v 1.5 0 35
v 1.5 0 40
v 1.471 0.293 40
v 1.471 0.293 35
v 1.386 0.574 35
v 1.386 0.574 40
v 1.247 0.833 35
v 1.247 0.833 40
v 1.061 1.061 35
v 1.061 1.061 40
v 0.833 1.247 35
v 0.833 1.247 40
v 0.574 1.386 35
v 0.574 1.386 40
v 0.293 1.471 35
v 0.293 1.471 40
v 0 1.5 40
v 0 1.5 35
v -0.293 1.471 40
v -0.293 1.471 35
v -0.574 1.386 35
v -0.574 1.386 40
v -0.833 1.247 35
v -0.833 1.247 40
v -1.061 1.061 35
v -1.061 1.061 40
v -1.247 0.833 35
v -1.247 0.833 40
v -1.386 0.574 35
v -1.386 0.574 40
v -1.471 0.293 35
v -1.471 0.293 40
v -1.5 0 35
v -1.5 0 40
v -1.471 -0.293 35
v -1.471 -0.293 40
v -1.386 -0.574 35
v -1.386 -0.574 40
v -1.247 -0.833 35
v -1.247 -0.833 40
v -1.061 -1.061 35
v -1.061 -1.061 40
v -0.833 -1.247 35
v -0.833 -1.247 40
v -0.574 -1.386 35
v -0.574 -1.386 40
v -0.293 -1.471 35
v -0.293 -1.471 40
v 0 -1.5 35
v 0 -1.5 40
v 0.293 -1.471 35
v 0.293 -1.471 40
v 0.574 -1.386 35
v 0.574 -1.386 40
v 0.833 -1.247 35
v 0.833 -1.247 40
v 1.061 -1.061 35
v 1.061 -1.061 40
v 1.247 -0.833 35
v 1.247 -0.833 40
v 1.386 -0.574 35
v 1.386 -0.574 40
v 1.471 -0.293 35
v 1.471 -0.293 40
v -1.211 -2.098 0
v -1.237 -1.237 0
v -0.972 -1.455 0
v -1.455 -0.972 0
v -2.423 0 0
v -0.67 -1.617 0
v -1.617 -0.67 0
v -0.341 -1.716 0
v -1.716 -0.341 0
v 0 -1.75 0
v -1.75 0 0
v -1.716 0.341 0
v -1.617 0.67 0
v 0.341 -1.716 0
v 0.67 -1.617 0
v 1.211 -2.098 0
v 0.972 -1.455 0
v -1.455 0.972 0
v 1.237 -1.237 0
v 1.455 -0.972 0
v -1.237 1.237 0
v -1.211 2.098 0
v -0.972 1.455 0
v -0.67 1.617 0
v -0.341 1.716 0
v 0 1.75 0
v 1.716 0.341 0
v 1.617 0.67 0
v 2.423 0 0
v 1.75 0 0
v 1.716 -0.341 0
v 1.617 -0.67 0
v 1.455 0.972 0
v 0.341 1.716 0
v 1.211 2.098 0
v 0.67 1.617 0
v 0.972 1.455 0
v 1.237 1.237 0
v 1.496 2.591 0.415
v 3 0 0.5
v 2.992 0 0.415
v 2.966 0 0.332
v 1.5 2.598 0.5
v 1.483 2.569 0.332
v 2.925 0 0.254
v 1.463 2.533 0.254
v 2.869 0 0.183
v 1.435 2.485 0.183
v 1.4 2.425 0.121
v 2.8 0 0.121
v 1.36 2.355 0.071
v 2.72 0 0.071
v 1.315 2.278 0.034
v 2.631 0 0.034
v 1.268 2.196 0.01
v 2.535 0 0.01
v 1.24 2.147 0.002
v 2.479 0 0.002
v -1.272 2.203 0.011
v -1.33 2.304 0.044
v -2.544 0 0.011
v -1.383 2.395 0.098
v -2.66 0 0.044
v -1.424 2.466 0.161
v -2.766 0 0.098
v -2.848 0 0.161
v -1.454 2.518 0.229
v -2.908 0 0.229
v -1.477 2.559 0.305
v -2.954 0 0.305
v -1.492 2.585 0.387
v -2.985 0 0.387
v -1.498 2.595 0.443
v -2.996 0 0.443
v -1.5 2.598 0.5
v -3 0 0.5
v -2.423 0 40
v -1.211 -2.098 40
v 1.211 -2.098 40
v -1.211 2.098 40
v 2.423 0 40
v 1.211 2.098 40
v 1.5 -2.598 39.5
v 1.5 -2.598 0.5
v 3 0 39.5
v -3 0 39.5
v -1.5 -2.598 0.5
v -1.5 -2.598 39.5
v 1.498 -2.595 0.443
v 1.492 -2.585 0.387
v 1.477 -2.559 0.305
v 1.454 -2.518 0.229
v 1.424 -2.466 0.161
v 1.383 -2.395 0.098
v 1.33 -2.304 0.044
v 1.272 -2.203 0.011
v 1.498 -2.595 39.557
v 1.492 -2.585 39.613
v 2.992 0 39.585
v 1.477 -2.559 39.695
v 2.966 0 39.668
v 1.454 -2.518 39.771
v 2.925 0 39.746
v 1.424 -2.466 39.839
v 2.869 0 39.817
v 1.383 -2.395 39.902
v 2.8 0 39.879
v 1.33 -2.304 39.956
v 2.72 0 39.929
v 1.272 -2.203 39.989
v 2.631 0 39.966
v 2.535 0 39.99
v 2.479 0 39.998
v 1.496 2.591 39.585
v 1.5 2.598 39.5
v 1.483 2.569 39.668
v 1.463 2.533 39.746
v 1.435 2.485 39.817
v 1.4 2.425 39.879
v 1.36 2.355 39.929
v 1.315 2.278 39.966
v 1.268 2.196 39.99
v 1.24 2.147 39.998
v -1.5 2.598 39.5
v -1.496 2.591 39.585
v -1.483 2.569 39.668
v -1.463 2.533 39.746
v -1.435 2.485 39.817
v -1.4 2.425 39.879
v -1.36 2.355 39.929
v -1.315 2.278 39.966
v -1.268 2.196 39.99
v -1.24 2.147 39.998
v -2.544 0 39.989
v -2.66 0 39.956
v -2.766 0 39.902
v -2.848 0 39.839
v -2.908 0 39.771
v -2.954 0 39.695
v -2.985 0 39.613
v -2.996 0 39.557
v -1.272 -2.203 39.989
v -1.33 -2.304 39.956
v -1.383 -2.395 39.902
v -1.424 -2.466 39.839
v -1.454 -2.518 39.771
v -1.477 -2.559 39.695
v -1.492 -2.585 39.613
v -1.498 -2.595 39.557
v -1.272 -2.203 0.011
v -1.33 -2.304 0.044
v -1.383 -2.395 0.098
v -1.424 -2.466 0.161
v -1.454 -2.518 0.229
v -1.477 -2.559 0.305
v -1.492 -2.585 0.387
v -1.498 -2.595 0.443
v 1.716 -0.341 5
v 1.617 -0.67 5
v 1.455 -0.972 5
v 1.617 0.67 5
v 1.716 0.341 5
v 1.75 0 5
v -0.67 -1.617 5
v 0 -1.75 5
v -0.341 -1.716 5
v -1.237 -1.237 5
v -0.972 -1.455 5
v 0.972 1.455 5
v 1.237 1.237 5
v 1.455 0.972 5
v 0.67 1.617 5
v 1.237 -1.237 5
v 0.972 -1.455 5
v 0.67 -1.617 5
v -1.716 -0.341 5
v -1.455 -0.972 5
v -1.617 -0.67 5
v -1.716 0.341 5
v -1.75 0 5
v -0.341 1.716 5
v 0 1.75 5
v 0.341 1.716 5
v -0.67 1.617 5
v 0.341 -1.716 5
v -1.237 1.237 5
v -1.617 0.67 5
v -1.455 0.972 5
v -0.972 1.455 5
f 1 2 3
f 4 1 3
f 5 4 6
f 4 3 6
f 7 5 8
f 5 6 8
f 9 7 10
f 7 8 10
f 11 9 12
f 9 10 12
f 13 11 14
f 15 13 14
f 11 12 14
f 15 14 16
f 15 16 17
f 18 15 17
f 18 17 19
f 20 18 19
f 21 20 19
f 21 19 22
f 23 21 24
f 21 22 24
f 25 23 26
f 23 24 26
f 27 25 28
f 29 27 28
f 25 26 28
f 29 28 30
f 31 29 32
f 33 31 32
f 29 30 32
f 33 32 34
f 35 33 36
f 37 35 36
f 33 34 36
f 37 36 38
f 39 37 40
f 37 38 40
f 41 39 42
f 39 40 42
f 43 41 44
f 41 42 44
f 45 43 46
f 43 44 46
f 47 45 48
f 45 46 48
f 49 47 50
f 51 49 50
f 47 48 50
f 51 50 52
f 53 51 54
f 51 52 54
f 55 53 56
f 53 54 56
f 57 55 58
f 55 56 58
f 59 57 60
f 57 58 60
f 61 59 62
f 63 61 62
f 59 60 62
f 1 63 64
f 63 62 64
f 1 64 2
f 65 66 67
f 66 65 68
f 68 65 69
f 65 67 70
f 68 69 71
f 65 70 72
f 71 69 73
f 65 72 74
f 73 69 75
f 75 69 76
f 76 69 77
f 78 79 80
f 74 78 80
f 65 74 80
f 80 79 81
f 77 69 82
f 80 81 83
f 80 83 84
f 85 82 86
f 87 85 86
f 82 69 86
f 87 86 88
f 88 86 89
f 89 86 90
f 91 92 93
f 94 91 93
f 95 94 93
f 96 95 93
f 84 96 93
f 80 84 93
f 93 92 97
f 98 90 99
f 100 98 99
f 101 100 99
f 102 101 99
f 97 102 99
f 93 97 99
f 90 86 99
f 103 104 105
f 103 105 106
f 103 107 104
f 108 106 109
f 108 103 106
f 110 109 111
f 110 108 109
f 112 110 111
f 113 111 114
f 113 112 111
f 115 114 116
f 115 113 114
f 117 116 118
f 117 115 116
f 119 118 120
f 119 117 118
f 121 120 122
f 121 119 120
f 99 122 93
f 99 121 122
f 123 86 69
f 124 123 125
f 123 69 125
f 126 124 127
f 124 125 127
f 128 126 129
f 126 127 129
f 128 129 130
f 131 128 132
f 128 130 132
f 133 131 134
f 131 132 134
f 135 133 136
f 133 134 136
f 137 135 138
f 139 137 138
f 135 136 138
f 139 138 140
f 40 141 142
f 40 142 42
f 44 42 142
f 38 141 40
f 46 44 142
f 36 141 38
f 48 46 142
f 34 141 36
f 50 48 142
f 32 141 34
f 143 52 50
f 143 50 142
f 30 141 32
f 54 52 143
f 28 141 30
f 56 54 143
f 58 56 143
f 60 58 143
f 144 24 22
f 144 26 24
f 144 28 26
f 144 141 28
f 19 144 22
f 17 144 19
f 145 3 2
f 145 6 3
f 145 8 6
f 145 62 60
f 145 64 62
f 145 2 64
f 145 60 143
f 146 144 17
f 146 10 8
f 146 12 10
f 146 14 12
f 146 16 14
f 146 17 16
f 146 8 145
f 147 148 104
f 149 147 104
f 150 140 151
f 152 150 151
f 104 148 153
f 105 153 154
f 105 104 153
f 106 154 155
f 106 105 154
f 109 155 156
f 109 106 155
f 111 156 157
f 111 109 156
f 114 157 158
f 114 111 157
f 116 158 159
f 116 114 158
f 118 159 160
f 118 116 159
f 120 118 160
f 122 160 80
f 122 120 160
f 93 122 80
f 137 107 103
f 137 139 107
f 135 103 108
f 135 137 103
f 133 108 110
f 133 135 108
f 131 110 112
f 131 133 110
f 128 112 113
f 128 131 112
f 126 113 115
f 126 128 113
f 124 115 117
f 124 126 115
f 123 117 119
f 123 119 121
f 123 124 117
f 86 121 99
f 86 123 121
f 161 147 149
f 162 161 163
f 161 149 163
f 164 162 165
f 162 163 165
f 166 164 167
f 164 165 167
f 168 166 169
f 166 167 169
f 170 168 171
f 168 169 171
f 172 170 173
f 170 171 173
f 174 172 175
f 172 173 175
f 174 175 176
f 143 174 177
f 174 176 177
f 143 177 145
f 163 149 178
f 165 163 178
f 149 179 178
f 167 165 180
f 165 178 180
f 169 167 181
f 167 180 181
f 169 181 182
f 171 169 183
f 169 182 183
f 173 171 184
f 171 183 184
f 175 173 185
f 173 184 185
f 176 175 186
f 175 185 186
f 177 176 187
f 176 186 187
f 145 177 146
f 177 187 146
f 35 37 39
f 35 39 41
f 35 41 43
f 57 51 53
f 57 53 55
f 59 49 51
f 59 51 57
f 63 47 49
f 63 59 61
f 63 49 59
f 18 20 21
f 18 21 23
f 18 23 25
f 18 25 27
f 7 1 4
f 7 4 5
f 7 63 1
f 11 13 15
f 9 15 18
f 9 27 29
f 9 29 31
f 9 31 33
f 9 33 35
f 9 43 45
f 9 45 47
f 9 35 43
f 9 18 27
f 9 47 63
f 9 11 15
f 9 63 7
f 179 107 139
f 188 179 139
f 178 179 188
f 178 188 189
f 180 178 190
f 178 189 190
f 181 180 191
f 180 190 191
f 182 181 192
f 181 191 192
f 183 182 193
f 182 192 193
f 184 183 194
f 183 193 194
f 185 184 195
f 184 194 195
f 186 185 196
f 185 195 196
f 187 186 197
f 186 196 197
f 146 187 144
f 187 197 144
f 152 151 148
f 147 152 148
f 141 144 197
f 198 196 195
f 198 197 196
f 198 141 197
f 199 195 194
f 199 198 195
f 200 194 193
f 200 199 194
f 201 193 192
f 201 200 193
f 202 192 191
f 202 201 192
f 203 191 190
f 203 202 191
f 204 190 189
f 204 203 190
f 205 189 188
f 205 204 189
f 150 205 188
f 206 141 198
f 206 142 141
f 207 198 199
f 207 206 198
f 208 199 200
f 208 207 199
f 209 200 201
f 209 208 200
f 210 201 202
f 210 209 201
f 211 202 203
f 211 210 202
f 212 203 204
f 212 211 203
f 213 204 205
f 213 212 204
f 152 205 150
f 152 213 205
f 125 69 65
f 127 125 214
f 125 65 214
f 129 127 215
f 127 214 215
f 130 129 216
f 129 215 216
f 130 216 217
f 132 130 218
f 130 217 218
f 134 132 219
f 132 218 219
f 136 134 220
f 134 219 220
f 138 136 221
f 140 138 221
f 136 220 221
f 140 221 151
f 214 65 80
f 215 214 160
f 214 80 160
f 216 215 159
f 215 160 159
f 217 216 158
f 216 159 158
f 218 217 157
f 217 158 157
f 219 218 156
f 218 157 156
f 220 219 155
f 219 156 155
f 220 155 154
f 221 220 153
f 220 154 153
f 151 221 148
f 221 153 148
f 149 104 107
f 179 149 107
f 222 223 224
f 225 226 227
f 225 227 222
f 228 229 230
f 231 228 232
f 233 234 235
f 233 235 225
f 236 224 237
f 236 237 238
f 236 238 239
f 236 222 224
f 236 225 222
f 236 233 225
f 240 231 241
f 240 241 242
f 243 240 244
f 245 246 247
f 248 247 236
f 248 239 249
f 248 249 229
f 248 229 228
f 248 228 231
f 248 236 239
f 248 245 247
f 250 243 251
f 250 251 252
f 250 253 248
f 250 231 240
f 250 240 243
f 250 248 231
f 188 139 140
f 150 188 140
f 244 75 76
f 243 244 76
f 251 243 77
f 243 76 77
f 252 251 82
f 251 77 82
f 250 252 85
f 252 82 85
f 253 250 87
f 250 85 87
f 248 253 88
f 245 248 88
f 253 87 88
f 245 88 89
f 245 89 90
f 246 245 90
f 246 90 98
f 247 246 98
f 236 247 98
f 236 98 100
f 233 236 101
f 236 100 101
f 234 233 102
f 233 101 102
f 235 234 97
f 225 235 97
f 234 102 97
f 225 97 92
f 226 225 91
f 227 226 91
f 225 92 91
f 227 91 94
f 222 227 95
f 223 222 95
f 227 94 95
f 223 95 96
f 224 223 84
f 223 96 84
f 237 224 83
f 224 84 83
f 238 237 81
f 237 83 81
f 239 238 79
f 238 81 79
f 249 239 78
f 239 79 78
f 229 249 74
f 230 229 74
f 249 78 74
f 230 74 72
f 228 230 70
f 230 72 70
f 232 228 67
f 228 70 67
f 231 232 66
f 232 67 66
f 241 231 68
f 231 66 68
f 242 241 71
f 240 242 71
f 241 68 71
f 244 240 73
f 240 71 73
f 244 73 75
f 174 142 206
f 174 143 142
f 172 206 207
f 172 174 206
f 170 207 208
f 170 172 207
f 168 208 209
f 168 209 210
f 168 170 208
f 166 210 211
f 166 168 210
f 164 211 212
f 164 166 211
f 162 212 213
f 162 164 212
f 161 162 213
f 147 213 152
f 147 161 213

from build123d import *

# Parameters (mm, degrees)
EXTRUDE_2_DEPTH     = 40
SKETCH_3_R          = 1.75
CUT_EXTRUDE_1_DEPTH = 5
FILLET_1_R          = 0.5
SKETCH_2_R          = 1.5
CUT_EXTRUDE_2_DEPTH = 5


with BuildPart() as part:
    # ｽｹｯﾁ1 → ﾎﾞｽ - 押し出し2 (new body)
    with BuildSketch(Plane.XY):
        Polygon((3, 0), (1.5, 2.598076211), (-1.5, 2.598076211), (-3, 0), (-1.5, -2.598076211), (1.5, -2.598076211), align=None)
    extrude(amount=EXTRUDE_2_DEPTH)

    # ｽｹｯﾁ3 → ｶｯﾄ - 押し出し1 (cut)
    with BuildSketch(Plane(origin=(0, 0, 0), x_dir=(-1, 0, 0), z_dir=(0, 0, -1))):
        Circle(SKETCH_3_R)
    extrude(amount=-CUT_EXTRUDE_1_DEPTH, mode=Mode.SUBTRACT)

    # ﾌｨﾚｯﾄ1
    fillet_1_edges = [part.edges().sort_by_distance(p)[0] for p in [
        (0, 2.598076211, 40),
        (-2.25, 1.299038106, 40),
        (-2.25, -1.299038106, 40),
        (0, -2.598076211, 40),
        (2.25, -1.299038106, 40),
        (0, -2.598076211, 0),
        (-2.25, -1.299038106, 0),
        (-2.25, 1.299038106, 0),
        (2.25, 1.299038106, 40),
        (0, 2.598076211, 0),
        (2.25, 1.299038106, 0),
        (2.25, -1.299038106, 0),
    ]]
    fillet(fillet_1_edges, radius=FILLET_1_R)

    # ｽｹｯﾁ2 → ｶｯﾄ - 押し出し2 (cut)
    with BuildSketch(Plane.XY.offset(40)):
        Circle(SKETCH_2_R)
    extrude(amount=-CUT_EXTRUDE_2_DEPTH, mode=Mode.SUBTRACT)


solid = part.part
